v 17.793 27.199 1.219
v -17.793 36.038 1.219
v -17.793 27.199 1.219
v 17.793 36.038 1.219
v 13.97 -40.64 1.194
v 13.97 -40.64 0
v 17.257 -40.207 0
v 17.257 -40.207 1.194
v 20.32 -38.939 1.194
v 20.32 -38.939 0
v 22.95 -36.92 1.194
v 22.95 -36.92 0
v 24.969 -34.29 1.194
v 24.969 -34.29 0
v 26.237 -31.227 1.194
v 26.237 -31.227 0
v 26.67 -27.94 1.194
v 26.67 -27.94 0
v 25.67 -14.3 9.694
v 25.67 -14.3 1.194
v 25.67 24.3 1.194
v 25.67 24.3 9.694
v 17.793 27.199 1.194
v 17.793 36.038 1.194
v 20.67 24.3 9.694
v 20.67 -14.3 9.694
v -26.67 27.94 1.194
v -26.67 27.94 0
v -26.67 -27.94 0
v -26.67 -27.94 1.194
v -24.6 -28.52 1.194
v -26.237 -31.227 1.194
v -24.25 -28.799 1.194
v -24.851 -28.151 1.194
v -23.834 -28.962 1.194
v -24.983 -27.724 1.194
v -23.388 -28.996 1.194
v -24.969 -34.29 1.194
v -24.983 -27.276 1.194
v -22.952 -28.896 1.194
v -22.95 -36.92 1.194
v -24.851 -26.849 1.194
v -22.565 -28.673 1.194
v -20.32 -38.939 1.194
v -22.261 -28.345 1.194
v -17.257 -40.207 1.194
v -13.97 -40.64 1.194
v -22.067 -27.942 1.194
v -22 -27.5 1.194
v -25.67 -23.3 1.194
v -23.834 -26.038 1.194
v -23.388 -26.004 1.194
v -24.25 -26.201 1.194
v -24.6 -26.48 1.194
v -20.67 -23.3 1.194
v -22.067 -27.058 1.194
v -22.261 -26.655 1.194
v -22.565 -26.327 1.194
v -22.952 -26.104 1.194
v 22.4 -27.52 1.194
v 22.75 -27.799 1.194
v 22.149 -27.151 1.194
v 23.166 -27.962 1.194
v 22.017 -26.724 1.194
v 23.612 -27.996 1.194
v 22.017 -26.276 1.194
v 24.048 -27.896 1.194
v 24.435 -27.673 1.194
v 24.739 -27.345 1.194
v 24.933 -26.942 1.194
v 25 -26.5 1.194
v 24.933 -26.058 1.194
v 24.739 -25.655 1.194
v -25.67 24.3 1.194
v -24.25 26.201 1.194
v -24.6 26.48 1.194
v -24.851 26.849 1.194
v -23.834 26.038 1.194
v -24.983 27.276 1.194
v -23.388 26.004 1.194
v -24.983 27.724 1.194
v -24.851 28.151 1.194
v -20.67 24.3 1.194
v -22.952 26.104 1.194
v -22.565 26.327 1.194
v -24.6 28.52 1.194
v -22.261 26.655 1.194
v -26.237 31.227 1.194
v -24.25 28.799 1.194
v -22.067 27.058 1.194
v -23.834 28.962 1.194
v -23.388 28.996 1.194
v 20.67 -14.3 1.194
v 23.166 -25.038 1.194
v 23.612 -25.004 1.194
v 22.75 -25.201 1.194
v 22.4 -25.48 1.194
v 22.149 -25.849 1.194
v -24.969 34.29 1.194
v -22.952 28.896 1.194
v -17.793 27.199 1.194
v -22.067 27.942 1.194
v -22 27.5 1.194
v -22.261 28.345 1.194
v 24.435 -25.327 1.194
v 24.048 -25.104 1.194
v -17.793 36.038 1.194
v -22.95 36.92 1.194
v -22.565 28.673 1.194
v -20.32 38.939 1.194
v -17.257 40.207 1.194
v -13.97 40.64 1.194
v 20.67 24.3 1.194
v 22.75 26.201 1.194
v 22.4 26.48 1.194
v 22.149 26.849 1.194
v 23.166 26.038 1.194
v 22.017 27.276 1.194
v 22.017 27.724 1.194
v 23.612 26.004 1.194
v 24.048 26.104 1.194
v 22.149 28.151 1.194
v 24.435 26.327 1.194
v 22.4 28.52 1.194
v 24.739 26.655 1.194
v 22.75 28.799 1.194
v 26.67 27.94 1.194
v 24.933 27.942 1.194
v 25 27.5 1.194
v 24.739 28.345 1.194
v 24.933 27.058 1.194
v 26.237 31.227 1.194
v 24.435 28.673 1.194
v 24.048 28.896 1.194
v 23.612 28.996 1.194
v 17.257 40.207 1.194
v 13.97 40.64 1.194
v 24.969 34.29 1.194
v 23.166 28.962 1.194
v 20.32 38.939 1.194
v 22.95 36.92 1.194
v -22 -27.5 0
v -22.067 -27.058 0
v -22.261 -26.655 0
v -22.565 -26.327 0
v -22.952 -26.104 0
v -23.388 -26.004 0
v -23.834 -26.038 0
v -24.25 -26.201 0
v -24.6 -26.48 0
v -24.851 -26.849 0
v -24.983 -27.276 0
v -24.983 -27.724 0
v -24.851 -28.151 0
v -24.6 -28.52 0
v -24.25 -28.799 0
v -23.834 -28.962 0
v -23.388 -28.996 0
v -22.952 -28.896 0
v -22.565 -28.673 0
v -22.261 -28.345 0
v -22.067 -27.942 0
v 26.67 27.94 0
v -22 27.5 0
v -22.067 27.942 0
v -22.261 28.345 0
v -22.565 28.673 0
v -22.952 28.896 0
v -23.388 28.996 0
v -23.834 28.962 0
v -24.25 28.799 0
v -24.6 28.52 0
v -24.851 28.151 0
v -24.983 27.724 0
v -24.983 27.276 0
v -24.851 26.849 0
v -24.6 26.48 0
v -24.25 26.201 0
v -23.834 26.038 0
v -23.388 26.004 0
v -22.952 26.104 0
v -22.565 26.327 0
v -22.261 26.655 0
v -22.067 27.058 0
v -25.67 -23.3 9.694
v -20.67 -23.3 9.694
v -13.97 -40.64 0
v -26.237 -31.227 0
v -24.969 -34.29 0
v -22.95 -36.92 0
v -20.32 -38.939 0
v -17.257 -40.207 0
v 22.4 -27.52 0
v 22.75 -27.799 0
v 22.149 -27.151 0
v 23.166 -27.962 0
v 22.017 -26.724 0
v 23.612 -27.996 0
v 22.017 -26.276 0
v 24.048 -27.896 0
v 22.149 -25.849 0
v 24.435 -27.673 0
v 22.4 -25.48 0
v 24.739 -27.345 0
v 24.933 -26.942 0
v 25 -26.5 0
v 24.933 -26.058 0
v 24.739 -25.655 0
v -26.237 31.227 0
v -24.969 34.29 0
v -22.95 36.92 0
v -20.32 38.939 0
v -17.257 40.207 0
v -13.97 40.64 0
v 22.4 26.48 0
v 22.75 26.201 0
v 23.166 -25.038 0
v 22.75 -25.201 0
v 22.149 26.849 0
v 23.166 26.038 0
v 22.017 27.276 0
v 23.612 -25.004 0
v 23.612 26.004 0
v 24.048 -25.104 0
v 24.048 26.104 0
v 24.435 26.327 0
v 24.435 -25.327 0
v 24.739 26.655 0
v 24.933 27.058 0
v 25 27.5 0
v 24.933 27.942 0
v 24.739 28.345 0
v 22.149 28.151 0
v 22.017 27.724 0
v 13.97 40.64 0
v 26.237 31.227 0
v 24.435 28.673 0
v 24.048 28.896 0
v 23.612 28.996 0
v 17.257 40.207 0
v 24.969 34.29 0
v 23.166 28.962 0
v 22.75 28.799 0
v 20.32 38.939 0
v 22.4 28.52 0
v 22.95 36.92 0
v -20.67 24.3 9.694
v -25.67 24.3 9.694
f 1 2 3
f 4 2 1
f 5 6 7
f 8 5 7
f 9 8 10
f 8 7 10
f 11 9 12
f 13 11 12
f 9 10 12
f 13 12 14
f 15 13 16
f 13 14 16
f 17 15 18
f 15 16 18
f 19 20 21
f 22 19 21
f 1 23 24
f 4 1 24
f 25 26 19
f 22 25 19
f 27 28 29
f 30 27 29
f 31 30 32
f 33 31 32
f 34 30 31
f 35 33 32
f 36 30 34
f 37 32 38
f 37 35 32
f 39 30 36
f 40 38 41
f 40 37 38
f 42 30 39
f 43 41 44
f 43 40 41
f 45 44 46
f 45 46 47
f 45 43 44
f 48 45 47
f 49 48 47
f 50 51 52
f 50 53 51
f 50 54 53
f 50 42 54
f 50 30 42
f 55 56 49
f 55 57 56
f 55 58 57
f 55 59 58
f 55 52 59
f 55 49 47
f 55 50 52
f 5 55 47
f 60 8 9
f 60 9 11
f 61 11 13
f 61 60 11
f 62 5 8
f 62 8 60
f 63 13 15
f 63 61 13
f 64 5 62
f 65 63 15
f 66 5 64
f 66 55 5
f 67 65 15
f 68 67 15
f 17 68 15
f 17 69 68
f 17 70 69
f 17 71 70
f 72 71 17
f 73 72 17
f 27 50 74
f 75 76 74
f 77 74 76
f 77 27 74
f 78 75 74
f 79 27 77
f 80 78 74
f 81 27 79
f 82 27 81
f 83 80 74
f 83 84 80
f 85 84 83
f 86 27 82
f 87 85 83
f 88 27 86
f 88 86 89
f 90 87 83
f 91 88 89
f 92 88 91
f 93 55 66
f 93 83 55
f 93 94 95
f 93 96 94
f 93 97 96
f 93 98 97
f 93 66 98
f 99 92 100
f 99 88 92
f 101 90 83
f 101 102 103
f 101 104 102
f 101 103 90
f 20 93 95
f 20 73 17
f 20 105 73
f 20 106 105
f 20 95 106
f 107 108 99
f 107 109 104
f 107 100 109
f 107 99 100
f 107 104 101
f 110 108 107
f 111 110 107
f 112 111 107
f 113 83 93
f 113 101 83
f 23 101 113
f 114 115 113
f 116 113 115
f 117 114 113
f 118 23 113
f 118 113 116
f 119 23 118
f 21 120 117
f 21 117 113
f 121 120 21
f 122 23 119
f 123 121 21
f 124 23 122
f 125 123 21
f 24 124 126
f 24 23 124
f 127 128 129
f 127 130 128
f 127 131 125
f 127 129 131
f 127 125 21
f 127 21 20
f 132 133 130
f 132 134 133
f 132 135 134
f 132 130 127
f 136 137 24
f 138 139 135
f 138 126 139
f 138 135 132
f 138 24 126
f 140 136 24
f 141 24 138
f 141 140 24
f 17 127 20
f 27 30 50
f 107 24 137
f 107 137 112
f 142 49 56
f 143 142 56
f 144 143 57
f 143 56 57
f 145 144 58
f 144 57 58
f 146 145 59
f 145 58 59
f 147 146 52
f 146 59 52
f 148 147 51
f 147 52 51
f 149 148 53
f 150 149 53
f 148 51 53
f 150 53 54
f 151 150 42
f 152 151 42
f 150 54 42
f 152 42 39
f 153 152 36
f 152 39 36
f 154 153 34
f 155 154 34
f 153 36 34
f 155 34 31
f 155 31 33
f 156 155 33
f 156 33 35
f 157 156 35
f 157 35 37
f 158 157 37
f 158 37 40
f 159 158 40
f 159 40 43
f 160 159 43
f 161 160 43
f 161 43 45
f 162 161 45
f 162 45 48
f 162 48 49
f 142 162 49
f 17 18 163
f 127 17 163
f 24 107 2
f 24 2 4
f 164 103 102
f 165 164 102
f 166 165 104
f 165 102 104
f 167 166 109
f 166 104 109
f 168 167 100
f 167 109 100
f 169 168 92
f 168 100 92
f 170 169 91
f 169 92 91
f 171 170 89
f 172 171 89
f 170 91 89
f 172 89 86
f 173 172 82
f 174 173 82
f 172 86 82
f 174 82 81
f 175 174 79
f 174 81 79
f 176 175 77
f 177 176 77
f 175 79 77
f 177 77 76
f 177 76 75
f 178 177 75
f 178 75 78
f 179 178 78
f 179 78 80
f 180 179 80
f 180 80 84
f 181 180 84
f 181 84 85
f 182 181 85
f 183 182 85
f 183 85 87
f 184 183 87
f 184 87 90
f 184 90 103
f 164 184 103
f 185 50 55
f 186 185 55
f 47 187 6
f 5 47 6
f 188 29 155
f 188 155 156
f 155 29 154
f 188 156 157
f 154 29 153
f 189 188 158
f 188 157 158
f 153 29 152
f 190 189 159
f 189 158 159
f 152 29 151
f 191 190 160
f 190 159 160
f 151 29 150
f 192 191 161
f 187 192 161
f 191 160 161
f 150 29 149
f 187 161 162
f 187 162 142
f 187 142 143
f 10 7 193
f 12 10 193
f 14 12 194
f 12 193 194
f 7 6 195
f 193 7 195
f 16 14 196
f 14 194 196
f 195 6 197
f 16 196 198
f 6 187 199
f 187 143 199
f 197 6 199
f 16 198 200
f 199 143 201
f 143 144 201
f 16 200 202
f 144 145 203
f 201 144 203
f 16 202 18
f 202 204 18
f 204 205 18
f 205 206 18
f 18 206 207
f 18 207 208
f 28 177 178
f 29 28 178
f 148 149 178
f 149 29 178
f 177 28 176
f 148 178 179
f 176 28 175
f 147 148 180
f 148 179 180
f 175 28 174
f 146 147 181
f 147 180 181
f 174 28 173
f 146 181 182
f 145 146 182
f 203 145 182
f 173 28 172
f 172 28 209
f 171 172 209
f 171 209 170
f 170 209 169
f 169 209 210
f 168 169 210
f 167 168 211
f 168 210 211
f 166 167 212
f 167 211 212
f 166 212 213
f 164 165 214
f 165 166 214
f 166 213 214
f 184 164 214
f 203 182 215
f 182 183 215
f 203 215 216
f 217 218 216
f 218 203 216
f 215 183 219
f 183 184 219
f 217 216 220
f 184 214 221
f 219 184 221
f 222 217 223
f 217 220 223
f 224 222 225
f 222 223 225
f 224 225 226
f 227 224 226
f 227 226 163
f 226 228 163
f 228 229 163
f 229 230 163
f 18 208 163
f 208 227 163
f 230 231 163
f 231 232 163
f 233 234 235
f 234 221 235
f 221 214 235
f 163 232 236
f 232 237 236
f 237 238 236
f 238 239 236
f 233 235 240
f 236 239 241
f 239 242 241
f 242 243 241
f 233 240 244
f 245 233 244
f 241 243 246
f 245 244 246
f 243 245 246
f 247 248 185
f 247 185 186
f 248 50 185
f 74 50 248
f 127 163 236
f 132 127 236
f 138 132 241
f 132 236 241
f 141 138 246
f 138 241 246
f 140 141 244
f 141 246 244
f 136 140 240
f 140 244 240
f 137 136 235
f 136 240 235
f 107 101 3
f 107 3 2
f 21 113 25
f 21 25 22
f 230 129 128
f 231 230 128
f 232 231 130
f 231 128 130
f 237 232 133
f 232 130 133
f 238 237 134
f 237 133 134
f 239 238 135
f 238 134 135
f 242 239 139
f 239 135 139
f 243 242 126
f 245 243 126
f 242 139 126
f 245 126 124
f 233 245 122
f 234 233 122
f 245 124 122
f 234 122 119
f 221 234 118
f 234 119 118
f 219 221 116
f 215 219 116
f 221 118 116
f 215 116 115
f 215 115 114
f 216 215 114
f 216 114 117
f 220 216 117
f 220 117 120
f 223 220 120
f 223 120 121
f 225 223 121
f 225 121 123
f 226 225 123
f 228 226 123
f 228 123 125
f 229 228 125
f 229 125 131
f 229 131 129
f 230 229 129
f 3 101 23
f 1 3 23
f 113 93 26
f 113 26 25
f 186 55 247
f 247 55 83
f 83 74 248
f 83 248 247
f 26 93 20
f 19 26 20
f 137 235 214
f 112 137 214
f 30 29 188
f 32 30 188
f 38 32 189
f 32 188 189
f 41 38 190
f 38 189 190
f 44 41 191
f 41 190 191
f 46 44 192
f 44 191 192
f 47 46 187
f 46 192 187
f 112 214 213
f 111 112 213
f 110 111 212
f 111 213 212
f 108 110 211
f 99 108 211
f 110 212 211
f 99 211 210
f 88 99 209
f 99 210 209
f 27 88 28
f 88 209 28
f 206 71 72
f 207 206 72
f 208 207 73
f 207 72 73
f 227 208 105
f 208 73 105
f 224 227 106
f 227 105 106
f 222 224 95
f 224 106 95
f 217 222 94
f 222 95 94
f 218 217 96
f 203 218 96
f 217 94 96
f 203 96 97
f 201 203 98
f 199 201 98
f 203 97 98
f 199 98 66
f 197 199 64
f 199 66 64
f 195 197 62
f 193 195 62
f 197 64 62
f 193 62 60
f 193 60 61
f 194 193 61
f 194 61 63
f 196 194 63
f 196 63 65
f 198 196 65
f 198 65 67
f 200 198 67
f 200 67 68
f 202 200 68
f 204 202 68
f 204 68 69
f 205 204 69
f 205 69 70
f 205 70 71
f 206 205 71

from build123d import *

# Parameters (mm, degrees)
F1_DEPTH = 1.1938
F2_R     = 1.5
F3_DEPTH = 1.1948
F4_W     = 5
F4_H     = 47.6
F4_H_2   = 38.6
F5_DEPTH = 8.5
F6_W     = 35.585186
F6_H     = 8.839631
F7_DEPTH = 0.0254


with BuildPart() as f1:
    # F0 (on Top) → F1 (new body)
    with BuildSketch(Plane.XY):
        with BuildLine():
            Line((-13.97, -40.64), (13.97, -40.64))
            ThreePointArc((13.97, -40.64), (22.950256, -36.920256), (26.67, -27.94))
            Line((26.67, -27.94), (26.67, 27.94))
            ThreePointArc((26.67, 27.94), (22.950256, 36.920256), (13.97, 40.64))
            Line((13.97, 40.64), (-13.97, 40.64))
            ThreePointArc((-13.97, 40.64), (-22.950256, 36.920256), (-26.67, 27.94))
            Line((-26.67, 27.94), (-26.67, -27.94))
            ThreePointArc((-26.67, -27.94), (-22.950256, -36.920256), (-13.97, -40.64))
        make_face()
    extrude(amount=F1_DEPTH)

    # F2 (on face) → F3 (cut, through all)
    with BuildSketch(Plane.XY.offset(1.1938)):
        with Locations((-23.5, 27.5)):
            Circle(F2_R)
        with Locations((23.5, 27.5)):
            Circle(F2_R)
        with Locations((-23.5, -27.5)):
            Circle(F2_R)
        with Locations((23.5, -26.5)):
            Circle(F2_R)
    extrude(amount=-F3_DEPTH, mode=Mode.SUBTRACT)

    # F4 (on face) → F5 (join)
    with BuildSketch(Plane.XY.offset(1.1938)):
        with Locations((-23.17, 0.5)):
            Rectangle(F4_W, F4_H)
        with Locations((23.17, 5)):
            Rectangle(F4_W, F4_H_2)
    extrude(amount=F5_DEPTH)

    # F6 (on face) → F7 (join)
    with BuildSketch(Plane.XY.offset(1.1938)):
        with Locations((1e-06, 31.618683)):
            Rectangle(F6_W, F6_H)
    extrude(amount=F7_DEPTH)


solid = f1.part
